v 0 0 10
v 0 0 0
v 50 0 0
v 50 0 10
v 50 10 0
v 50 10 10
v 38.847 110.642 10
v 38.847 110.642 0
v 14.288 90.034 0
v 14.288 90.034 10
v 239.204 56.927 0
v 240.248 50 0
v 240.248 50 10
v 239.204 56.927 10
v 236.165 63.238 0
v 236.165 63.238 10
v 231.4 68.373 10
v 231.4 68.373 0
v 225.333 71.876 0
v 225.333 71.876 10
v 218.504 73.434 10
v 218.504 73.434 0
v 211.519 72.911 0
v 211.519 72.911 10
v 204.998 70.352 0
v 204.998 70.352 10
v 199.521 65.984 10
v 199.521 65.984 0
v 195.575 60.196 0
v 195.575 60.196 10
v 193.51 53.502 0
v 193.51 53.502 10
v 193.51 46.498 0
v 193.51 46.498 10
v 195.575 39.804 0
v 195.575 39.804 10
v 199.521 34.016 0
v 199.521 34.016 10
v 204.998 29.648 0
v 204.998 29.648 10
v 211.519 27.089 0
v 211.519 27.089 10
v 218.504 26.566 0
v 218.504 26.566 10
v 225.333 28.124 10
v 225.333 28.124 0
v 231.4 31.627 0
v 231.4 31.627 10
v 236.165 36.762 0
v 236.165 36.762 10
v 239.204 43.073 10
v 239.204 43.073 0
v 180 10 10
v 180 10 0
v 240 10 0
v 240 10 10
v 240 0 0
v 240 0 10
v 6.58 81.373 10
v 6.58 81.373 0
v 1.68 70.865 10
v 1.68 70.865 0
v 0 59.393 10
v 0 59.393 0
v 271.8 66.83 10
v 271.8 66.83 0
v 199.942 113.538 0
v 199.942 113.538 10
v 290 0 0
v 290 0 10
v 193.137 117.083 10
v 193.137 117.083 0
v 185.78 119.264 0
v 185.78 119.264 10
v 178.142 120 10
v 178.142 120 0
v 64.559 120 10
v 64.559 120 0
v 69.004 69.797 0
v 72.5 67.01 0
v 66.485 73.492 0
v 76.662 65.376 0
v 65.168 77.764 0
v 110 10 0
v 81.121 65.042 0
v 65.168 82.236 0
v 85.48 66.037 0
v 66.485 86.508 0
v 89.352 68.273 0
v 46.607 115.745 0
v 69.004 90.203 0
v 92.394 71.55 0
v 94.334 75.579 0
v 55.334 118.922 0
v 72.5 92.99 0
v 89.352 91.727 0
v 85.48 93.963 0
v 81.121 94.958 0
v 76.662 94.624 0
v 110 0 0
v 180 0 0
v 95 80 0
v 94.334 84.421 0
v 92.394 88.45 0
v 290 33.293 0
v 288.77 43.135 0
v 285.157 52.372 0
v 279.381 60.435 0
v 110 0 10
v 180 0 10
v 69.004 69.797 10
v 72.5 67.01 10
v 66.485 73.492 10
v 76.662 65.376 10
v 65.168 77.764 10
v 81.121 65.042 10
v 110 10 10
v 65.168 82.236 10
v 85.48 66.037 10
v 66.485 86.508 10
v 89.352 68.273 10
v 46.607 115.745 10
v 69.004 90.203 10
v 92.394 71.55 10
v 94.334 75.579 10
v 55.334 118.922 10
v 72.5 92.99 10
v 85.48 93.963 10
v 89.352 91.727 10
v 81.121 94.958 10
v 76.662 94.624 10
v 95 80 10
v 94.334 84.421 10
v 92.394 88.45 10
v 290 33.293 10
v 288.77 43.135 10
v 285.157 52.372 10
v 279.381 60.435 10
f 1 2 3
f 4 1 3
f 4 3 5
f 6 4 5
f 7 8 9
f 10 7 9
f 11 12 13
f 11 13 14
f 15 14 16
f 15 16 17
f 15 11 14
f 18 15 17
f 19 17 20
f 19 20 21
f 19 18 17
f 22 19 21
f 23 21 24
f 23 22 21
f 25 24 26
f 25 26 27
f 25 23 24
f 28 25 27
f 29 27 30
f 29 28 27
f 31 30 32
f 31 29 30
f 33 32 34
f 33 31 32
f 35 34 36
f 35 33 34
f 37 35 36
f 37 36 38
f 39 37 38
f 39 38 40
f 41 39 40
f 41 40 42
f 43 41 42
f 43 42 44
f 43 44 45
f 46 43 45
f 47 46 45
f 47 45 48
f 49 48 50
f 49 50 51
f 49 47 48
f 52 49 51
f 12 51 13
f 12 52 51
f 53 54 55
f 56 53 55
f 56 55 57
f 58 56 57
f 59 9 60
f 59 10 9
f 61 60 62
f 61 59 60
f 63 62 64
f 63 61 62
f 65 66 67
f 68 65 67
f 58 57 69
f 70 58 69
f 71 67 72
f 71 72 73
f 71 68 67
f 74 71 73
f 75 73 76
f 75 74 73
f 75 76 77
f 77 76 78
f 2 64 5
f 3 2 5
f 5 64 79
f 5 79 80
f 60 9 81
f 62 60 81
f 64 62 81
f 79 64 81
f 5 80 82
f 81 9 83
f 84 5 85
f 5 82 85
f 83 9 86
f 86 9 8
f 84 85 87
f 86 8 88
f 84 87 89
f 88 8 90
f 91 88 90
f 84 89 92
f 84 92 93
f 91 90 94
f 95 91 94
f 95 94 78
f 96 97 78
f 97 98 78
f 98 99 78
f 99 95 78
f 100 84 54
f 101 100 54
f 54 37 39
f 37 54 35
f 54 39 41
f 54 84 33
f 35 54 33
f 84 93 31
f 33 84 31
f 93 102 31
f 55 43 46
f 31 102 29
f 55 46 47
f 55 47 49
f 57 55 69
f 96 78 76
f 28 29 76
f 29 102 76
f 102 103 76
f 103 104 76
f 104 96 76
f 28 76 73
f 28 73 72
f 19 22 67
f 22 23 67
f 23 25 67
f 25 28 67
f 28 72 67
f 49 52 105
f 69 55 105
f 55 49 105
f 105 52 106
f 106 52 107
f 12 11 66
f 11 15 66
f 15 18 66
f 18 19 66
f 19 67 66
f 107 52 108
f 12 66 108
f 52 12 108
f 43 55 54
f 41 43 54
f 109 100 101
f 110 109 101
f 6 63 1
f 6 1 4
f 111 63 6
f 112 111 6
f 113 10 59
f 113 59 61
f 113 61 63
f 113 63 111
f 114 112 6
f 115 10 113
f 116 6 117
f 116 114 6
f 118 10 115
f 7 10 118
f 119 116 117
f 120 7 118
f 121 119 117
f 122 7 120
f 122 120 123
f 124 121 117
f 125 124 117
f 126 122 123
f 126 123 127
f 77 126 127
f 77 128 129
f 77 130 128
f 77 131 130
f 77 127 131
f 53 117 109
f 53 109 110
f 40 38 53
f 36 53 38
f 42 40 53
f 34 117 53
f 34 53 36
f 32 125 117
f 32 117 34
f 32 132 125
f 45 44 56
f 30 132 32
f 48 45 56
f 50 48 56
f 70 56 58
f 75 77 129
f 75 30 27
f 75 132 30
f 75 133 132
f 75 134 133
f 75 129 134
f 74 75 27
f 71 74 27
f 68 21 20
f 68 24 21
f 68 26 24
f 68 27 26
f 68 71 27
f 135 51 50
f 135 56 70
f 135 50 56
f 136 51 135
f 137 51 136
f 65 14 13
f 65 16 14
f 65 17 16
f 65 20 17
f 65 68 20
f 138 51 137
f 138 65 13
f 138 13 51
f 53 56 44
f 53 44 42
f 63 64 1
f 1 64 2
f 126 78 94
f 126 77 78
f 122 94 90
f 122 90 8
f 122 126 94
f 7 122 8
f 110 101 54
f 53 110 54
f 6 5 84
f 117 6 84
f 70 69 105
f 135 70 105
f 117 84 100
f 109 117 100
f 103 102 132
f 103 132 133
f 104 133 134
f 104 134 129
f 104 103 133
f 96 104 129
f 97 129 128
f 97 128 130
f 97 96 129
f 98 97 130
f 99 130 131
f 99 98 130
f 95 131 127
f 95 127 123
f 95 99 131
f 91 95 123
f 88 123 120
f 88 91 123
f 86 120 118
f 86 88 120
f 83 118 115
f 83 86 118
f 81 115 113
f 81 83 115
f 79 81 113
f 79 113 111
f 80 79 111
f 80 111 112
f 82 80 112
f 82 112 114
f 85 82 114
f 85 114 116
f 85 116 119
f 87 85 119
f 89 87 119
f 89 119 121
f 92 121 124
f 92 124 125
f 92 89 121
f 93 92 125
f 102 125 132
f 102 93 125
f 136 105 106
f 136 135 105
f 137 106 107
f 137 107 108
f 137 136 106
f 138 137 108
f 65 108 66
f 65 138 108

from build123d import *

# Parameters (mm, degrees)
ESQUISSE1_R        = 15
ESQUISSE1_R_2      = 23.5
BOSS_EXTRU_1_DEPTH = 10
CONG_1_R           = 40


with BuildPart() as part:
    # Esquisse1 → Boss.-Extru.1 (new body)
    with BuildSketch(Plane.XY):
        Polygon((290, 0), (290, 55), (190, 120), (50, 120), (0, 78.045018441), (0, 0), (50, 0), (50, 10), (110, 10), (110, 0), (180, 0), (180, 10), (240, 10), (240, 0), align=None)
        with Locations((80, 80)):
            Circle(ESQUISSE1_R, mode=Mode.SUBTRACT)
        with Locations((216.747943312, 50)):
            Circle(ESQUISSE1_R_2, mode=Mode.SUBTRACT)
    extrude(amount=BOSS_EXTRU_1_DEPTH)

    # Congé1
    cong_1_edges = [part.edges().sort_by_distance(p)[0] for p in [
        (0, 78.045018441, 5),
        (50, 120, 5),
        (190, 120, 5),
        (290, 55, 5),
    ]]
    fillet(cong_1_edges, radius=CONG_1_R)


solid = part.part
